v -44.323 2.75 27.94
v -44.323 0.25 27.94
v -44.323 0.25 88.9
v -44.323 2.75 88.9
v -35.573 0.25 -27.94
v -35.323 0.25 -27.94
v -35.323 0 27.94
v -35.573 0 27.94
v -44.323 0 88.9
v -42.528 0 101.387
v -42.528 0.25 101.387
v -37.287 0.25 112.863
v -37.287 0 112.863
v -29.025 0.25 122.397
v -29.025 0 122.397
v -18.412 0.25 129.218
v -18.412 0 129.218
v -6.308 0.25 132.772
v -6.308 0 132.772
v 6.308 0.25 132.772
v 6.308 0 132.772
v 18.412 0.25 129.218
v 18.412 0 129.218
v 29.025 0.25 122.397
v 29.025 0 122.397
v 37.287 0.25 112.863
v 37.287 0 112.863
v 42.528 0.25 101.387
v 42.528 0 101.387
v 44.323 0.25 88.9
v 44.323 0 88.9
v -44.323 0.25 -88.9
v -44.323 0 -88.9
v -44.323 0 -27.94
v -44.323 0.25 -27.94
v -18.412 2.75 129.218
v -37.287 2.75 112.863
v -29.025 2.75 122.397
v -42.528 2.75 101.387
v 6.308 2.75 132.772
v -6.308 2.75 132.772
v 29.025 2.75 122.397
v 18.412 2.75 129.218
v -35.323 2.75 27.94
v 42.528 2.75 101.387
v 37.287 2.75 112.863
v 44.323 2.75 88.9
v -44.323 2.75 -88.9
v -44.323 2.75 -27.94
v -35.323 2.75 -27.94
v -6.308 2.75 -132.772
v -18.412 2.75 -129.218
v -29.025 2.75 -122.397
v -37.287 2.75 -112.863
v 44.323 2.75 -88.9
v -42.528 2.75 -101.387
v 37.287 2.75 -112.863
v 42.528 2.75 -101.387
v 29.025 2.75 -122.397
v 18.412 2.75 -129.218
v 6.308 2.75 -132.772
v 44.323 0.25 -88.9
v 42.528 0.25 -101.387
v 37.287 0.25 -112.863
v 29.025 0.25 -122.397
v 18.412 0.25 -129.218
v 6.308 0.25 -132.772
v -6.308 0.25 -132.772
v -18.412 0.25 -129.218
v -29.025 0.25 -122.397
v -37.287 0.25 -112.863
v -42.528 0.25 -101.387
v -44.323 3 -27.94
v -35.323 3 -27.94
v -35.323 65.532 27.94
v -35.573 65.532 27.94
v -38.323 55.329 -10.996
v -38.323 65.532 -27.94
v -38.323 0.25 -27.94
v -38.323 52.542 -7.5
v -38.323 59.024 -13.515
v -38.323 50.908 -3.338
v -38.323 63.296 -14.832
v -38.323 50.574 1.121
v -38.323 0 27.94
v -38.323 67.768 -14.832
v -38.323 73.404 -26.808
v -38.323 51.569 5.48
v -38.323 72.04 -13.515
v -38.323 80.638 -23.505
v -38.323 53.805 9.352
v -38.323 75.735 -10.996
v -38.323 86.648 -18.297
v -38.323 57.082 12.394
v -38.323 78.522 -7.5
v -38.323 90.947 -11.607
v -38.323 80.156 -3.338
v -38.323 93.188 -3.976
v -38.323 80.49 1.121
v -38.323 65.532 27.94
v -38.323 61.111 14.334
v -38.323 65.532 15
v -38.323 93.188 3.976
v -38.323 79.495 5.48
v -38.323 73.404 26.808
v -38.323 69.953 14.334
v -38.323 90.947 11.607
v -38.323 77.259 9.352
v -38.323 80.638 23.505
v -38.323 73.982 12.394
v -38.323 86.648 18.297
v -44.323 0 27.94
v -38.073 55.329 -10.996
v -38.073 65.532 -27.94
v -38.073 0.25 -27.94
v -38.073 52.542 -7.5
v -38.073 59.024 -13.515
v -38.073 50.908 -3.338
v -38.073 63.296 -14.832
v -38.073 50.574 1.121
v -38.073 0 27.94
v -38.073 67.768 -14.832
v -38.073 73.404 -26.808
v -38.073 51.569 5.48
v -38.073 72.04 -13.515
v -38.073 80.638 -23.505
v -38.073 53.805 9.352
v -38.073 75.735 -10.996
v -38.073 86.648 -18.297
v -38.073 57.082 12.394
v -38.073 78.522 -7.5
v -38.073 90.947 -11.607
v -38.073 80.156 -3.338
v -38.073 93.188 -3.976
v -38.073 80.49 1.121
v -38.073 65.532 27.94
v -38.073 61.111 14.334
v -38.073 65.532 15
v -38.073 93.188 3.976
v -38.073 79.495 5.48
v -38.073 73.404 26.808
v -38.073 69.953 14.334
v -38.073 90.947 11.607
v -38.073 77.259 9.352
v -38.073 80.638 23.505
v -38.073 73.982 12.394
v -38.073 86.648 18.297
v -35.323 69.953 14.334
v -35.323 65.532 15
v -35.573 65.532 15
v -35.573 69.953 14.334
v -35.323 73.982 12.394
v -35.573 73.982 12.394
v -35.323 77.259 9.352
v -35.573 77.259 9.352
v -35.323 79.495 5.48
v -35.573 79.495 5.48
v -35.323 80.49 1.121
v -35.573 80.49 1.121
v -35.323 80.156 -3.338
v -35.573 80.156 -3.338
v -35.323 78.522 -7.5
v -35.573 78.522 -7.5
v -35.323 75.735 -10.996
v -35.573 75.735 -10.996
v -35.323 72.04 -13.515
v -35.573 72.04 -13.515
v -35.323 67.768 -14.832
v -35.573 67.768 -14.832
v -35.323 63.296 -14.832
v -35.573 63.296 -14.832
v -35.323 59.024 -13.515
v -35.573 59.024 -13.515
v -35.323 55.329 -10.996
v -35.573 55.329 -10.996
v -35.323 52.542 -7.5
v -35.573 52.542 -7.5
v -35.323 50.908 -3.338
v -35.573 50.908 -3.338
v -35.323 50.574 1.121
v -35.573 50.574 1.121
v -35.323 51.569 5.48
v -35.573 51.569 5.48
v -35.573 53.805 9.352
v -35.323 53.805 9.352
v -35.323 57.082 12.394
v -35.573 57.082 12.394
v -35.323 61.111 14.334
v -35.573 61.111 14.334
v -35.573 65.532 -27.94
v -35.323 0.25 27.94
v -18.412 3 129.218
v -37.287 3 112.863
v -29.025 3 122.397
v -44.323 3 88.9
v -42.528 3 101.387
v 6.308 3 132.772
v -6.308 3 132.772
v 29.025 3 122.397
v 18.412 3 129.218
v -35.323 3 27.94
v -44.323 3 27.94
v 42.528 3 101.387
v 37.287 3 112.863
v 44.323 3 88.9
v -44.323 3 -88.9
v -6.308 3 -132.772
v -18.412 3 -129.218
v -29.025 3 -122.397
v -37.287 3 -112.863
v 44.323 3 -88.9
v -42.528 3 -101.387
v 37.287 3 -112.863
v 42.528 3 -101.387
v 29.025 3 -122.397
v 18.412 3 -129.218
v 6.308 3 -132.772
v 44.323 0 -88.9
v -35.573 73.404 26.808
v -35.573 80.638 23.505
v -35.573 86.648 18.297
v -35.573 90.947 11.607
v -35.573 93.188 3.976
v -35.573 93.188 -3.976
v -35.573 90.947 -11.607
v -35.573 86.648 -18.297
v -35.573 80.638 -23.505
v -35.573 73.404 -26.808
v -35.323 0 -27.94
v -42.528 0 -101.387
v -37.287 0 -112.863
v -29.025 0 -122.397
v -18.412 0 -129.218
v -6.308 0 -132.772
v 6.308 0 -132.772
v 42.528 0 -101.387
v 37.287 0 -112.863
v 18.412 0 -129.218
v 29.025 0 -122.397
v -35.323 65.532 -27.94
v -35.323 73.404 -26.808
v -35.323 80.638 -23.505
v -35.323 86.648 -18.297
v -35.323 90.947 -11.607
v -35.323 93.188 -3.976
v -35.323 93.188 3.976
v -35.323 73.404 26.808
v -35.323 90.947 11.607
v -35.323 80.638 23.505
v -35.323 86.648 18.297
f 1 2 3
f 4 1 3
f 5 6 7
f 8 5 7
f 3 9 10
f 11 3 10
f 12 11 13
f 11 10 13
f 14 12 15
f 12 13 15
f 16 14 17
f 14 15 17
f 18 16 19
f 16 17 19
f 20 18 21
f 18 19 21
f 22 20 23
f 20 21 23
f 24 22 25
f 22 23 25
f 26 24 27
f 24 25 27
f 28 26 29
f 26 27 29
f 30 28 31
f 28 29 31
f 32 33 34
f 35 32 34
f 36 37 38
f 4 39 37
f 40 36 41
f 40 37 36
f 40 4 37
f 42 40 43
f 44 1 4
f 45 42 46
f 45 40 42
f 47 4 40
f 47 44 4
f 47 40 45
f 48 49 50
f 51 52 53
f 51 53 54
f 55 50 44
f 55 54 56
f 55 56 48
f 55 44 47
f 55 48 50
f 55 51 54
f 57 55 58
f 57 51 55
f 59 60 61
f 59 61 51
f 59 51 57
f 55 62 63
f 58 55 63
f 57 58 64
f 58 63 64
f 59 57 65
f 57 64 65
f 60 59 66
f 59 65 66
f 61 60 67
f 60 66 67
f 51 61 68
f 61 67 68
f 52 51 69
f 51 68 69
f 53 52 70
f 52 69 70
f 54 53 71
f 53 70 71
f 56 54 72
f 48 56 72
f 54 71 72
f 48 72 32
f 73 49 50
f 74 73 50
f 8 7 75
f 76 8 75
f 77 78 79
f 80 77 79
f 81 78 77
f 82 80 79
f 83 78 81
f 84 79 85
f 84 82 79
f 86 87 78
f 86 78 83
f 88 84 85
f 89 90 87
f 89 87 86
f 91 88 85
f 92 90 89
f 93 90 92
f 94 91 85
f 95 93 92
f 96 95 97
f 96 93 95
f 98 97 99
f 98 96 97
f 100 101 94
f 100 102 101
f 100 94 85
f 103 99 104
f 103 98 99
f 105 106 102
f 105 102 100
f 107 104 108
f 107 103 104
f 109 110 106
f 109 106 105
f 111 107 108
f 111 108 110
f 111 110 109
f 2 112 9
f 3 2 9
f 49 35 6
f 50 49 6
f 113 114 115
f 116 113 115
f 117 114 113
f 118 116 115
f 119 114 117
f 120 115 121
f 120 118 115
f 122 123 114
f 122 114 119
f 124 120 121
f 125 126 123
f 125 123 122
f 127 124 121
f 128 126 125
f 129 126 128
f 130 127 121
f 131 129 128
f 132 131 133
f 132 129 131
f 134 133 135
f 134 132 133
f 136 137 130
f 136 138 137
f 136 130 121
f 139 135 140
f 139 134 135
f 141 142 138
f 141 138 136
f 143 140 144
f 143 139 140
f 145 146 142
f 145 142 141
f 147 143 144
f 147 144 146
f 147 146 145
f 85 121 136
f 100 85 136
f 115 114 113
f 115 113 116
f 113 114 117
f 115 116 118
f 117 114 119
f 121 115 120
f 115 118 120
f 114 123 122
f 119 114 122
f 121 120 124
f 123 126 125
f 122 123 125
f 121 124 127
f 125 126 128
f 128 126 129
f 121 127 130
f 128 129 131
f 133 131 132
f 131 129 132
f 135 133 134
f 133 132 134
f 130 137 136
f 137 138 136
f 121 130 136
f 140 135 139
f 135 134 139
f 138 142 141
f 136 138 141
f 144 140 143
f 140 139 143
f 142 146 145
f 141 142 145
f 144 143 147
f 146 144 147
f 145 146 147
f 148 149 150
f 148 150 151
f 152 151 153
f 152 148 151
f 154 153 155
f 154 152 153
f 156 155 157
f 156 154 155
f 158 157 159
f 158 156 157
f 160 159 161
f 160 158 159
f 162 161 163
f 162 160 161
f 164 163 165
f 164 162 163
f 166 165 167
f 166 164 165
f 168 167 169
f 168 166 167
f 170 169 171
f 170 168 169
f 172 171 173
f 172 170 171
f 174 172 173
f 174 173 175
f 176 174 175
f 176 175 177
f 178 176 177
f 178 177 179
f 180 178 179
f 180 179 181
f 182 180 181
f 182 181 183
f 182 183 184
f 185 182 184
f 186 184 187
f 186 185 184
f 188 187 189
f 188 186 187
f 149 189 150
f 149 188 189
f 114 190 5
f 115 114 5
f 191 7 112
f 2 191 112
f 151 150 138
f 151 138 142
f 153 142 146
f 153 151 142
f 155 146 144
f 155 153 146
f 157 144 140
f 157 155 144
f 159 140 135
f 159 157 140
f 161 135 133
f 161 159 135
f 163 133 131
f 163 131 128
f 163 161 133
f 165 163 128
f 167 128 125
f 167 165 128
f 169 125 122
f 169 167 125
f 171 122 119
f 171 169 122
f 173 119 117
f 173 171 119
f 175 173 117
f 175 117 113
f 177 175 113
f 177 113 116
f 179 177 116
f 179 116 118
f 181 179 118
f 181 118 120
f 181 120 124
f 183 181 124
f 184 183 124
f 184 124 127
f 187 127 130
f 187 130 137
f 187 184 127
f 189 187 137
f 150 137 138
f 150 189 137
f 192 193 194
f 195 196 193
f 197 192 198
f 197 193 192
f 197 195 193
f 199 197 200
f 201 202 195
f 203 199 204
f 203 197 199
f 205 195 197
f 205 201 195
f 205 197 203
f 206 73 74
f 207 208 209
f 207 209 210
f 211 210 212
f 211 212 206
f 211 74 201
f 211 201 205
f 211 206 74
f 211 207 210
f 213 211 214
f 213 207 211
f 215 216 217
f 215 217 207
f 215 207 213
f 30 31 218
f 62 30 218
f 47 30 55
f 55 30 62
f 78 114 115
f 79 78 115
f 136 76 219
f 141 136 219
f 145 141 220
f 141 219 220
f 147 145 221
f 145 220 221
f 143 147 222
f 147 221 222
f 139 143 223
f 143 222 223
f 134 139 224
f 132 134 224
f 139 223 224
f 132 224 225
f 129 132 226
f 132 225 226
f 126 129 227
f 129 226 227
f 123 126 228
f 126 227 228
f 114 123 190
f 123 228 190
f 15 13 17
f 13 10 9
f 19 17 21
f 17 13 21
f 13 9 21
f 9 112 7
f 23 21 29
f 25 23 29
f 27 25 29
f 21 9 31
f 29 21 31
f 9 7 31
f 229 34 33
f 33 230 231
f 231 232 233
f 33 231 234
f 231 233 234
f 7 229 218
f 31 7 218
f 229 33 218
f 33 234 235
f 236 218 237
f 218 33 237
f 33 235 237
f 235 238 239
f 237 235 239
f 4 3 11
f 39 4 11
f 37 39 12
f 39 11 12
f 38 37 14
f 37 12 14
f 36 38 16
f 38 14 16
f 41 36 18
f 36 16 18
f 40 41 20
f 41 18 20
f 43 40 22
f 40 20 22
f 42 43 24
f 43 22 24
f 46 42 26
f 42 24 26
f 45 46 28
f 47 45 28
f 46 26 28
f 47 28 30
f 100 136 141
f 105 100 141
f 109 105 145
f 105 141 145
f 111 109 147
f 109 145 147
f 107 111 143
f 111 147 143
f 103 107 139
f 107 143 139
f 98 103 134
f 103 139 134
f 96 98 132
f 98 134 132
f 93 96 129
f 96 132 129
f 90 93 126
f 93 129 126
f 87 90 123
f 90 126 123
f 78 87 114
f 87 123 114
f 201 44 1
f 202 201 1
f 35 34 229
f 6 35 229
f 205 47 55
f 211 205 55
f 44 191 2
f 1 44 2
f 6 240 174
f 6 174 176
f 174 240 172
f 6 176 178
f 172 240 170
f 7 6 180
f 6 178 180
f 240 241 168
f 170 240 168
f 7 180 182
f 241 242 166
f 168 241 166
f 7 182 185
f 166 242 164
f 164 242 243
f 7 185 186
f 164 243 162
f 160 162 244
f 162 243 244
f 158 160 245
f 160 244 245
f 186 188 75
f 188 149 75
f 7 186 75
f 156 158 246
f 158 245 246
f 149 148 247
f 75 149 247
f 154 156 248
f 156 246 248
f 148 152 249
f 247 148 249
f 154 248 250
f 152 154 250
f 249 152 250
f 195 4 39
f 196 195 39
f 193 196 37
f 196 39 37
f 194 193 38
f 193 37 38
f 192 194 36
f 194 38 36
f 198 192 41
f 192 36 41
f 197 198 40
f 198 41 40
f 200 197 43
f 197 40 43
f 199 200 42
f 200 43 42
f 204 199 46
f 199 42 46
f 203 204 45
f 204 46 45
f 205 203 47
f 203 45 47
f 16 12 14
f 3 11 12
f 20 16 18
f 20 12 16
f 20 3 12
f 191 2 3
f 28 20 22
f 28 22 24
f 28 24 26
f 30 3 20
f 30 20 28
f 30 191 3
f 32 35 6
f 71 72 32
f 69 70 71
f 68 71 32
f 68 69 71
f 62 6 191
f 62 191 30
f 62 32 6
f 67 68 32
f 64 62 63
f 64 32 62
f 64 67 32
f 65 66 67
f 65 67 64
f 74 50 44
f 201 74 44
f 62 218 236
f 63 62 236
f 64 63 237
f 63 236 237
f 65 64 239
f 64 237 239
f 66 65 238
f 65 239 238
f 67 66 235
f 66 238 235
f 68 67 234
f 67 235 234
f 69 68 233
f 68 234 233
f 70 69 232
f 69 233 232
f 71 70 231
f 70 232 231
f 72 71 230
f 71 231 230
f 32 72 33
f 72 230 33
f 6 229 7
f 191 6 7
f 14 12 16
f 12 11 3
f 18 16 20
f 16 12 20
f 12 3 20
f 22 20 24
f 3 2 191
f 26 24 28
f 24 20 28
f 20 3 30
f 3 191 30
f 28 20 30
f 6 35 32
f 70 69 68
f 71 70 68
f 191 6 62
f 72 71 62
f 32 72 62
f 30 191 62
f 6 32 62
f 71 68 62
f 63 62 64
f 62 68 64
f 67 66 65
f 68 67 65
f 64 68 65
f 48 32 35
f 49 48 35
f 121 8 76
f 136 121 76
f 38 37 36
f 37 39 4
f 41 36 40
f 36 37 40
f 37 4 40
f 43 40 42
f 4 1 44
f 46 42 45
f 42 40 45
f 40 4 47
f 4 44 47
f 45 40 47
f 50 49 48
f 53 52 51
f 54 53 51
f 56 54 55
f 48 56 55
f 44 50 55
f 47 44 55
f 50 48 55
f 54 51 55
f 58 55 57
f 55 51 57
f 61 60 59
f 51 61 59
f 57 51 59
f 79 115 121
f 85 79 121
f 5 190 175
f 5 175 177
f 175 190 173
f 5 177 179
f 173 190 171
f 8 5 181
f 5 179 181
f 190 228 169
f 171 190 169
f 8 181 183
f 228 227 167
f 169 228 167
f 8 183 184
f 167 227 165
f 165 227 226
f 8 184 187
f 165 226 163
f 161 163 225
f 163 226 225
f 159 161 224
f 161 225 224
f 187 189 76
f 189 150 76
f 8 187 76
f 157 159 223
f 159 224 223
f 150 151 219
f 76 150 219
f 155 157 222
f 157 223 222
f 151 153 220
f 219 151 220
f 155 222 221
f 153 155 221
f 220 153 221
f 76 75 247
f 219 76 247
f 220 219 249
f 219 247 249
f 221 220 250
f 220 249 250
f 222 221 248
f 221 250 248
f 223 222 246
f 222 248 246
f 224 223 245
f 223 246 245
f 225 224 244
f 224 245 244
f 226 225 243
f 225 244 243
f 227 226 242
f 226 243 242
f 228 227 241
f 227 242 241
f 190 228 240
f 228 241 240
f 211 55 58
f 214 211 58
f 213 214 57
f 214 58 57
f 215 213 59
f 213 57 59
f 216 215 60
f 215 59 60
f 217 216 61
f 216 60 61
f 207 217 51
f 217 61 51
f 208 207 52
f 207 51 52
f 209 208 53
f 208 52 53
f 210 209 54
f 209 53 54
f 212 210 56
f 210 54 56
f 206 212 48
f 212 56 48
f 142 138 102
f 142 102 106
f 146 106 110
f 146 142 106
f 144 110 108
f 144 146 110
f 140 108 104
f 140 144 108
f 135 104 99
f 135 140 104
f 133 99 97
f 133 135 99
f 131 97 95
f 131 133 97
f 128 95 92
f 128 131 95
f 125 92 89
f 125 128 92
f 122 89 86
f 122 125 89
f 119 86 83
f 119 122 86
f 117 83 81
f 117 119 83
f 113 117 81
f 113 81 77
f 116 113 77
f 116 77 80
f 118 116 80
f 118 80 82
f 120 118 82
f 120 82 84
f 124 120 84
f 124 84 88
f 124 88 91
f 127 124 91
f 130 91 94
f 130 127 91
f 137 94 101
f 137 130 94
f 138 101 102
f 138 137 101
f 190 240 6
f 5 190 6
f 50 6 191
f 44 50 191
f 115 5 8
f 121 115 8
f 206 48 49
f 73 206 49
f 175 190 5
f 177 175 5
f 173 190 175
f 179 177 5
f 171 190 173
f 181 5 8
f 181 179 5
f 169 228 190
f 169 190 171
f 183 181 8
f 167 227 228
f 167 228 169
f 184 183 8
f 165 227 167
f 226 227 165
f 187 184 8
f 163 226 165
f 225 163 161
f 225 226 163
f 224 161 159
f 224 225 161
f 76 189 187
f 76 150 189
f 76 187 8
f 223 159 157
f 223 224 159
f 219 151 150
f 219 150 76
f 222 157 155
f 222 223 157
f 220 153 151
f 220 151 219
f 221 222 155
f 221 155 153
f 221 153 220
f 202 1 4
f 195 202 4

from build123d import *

# Parameters (mm, degrees)
BOSS_EXTRUDE1_DEPTH = 0.25
BOSS_EXTRUDE2_DEPTH = 2.5
BOSS_EXTRUDE3_DEPTH = 0.25
SKETCH6_R           = 15
BOSS_EXTRUDE5_DEPTH = 0.25
SKETCH7_R           = 15
BOSS_EXTRUDE7_DEPTH = 2.5
SKETCH8_R           = 15
BOSS_EXTRUDE8_DEPTH = 0.25


with BuildPart() as part:
    # Sketch1 → Boss-Extrude1 (new body)
    with BuildSketch(Plane(origin=(0, 0, 0), x_dir=(1, 0, 0), z_dir=(0, 1, 0))):
        with BuildLine():
            Line((-44.323, 88.9), (-44.323, 27.94))
            Line((-44.323, 27.94), (-35.323, 27.94))
            Line((-35.323, 27.94), (-35.323, -27.94))
            Line((-35.323, -27.94), (-44.323, -27.94))
            Line((-44.323, -27.94), (-44.323, -88.9))
            ThreePointArc((-44.323, -88.9), (0, -133.223), (44.323, -88.9))
            Line((44.323, -88.9), (44.323, 88.9))
            ThreePointArc((44.323, 88.9), (0, 133.223), (-44.323, 88.9))
        make_face()
    extrude(amount=BOSS_EXTRUDE1_DEPTH)


with BuildPart() as body_2:
    # Sketch2 → Boss-Extrude2 (new body)
    with BuildSketch(Plane(origin=(0, 0.25, 0), x_dir=(1, 0, 0), z_dir=(0, 1, 0))):
        with BuildLine():
            Line((-44.323, 27.94), (-35.323, 27.94))
            Line((-35.323, 27.94), (-35.323, -27.94))
            Line((-35.323, -27.94), (-44.323, -27.94))
            Line((-44.323, -27.94), (-44.323, -88.9))
            ThreePointArc((-44.323, -88.9), (0, -133.223), (44.323, -88.9))
            Line((44.323, -88.9), (44.323, 88.9))
            ThreePointArc((44.323, 88.9), (0, 133.223), (-44.323, 88.9))
            Line((-44.323, 88.9), (-44.323, 27.94))
        make_face()
    extrude(amount=BOSS_EXTRUDE2_DEPTH)


with BuildPart() as body_3:
    # Sketch3 → Boss-Extrude3 (new body)
    with BuildSketch(Plane(origin=(0, 2.75, 0), x_dir=(1, 0, 0), z_dir=(0, 1, 0))):
        with BuildLine():
            Line((-35.323, -27.94), (-44.323, -27.94))
            Line((-44.323, -27.94), (-44.323, -88.9))
            ThreePointArc((-44.323, -88.9), (0, -133.223), (44.323, -88.9))
            Line((44.323, -88.9), (44.323, 88.9))
            ThreePointArc((44.323, 88.9), (0, 133.223), (-44.323, 88.9))
            Line((-44.323, 88.9), (-44.323, 27.94))
            Line((-44.323, 27.94), (-35.323, 27.94))
            Line((-35.323, 27.94), (-35.323, -27.94))
        make_face()
    extrude(amount=BOSS_EXTRUDE3_DEPTH)


with BuildPart() as body_4:
    # Sketch6 → Boss-Extrude5 (new body)
    with BuildSketch(Plane.ZY.offset(35.323)):
        with BuildLine():
            ThreePointArc((27.94, 65.532), (0, 93.472), (-27.94, 65.532))
            Line((-27.94, 65.532), (-27.94, 0.25))
            Line((-27.94, 0.25), (27.94, 0))
            Line((27.94, 0), (27.94, 65.532))
        make_face()
        with Locations((0, 65.532)):
            Circle(SKETCH6_R, mode=Mode.SUBTRACT)
    extrude(amount=BOSS_EXTRUDE5_DEPTH)


with BuildPart() as body_5:
    # Sketch7 → Boss-Extrude7 (new body)
    with BuildSketch(Plane.ZY.offset(35.573)):
        with BuildLine():
            Line((-27.94, 0.25), (27.94, 0))
            Line((27.94, 0), (27.94, 65.532))
            ThreePointArc((27.94, 65.532), (0, 93.472), (-27.94, 65.532))
            Line((-27.94, 65.532), (-27.94, 0.25))
        make_face()
        with Locations((0, 65.532)):
            Circle(SKETCH7_R, mode=Mode.SUBTRACT)
    extrude(amount=BOSS_EXTRUDE7_DEPTH)


with BuildPart() as body_6:
    # Sketch8 → Boss-Extrude8 (new body)
    with BuildSketch(Plane.ZY.offset(38.073)):
        with BuildLine():
            Line((-27.94, 65.532), (-27.94, 0.25))
            Line((-27.94, 0.25), (27.94, 0))
            Line((27.94, 0), (27.94, 65.532))
            ThreePointArc((27.94, 65.532), (0, 93.472), (-27.94, 65.532))
        make_face()
        with Locations((0, 65.532)):
            Circle(SKETCH8_R, mode=Mode.SUBTRACT)
    extrude(amount=BOSS_EXTRUDE8_DEPTH)


solid = Compound([part.part, body_2.part, body_3.part, body_4.part, body_5.part, body_6.part])
